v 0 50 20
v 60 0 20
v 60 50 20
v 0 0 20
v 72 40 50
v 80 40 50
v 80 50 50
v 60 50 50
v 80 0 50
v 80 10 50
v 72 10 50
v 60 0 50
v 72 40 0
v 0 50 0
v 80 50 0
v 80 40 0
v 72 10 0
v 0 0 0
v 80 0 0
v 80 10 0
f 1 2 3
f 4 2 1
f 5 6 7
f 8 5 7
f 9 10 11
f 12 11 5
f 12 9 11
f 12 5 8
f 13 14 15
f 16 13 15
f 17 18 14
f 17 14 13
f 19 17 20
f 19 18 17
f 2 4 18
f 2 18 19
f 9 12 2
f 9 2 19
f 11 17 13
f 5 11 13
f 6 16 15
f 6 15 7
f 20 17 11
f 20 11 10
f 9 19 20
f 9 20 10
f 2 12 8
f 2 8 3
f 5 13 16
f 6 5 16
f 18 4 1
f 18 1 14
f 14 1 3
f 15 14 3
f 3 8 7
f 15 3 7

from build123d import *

# Parameters (mm, degrees)
F1_DEPTH = 50
F2_W     = 8
F2_H     = 30
F3_DEPTH = 50.001


with BuildPart() as f1:
    # F0 (on Front) → F1 (new body)
    with BuildSketch(Plane.XZ):
        Polygon((0, 20), (0, 0), (80, 0), (80, 50), (60, 50), (60, 20), align=None)
    extrude(amount=-F1_DEPTH)

    # F2 (on Top) → F3 (cut, through all)
    with BuildSketch(Plane.XY):
        with Locations((76, 25)):
            Rectangle(F2_W, F2_H)
    extrude(amount=F3_DEPTH, mode=Mode.SUBTRACT)


solid = f1.part
